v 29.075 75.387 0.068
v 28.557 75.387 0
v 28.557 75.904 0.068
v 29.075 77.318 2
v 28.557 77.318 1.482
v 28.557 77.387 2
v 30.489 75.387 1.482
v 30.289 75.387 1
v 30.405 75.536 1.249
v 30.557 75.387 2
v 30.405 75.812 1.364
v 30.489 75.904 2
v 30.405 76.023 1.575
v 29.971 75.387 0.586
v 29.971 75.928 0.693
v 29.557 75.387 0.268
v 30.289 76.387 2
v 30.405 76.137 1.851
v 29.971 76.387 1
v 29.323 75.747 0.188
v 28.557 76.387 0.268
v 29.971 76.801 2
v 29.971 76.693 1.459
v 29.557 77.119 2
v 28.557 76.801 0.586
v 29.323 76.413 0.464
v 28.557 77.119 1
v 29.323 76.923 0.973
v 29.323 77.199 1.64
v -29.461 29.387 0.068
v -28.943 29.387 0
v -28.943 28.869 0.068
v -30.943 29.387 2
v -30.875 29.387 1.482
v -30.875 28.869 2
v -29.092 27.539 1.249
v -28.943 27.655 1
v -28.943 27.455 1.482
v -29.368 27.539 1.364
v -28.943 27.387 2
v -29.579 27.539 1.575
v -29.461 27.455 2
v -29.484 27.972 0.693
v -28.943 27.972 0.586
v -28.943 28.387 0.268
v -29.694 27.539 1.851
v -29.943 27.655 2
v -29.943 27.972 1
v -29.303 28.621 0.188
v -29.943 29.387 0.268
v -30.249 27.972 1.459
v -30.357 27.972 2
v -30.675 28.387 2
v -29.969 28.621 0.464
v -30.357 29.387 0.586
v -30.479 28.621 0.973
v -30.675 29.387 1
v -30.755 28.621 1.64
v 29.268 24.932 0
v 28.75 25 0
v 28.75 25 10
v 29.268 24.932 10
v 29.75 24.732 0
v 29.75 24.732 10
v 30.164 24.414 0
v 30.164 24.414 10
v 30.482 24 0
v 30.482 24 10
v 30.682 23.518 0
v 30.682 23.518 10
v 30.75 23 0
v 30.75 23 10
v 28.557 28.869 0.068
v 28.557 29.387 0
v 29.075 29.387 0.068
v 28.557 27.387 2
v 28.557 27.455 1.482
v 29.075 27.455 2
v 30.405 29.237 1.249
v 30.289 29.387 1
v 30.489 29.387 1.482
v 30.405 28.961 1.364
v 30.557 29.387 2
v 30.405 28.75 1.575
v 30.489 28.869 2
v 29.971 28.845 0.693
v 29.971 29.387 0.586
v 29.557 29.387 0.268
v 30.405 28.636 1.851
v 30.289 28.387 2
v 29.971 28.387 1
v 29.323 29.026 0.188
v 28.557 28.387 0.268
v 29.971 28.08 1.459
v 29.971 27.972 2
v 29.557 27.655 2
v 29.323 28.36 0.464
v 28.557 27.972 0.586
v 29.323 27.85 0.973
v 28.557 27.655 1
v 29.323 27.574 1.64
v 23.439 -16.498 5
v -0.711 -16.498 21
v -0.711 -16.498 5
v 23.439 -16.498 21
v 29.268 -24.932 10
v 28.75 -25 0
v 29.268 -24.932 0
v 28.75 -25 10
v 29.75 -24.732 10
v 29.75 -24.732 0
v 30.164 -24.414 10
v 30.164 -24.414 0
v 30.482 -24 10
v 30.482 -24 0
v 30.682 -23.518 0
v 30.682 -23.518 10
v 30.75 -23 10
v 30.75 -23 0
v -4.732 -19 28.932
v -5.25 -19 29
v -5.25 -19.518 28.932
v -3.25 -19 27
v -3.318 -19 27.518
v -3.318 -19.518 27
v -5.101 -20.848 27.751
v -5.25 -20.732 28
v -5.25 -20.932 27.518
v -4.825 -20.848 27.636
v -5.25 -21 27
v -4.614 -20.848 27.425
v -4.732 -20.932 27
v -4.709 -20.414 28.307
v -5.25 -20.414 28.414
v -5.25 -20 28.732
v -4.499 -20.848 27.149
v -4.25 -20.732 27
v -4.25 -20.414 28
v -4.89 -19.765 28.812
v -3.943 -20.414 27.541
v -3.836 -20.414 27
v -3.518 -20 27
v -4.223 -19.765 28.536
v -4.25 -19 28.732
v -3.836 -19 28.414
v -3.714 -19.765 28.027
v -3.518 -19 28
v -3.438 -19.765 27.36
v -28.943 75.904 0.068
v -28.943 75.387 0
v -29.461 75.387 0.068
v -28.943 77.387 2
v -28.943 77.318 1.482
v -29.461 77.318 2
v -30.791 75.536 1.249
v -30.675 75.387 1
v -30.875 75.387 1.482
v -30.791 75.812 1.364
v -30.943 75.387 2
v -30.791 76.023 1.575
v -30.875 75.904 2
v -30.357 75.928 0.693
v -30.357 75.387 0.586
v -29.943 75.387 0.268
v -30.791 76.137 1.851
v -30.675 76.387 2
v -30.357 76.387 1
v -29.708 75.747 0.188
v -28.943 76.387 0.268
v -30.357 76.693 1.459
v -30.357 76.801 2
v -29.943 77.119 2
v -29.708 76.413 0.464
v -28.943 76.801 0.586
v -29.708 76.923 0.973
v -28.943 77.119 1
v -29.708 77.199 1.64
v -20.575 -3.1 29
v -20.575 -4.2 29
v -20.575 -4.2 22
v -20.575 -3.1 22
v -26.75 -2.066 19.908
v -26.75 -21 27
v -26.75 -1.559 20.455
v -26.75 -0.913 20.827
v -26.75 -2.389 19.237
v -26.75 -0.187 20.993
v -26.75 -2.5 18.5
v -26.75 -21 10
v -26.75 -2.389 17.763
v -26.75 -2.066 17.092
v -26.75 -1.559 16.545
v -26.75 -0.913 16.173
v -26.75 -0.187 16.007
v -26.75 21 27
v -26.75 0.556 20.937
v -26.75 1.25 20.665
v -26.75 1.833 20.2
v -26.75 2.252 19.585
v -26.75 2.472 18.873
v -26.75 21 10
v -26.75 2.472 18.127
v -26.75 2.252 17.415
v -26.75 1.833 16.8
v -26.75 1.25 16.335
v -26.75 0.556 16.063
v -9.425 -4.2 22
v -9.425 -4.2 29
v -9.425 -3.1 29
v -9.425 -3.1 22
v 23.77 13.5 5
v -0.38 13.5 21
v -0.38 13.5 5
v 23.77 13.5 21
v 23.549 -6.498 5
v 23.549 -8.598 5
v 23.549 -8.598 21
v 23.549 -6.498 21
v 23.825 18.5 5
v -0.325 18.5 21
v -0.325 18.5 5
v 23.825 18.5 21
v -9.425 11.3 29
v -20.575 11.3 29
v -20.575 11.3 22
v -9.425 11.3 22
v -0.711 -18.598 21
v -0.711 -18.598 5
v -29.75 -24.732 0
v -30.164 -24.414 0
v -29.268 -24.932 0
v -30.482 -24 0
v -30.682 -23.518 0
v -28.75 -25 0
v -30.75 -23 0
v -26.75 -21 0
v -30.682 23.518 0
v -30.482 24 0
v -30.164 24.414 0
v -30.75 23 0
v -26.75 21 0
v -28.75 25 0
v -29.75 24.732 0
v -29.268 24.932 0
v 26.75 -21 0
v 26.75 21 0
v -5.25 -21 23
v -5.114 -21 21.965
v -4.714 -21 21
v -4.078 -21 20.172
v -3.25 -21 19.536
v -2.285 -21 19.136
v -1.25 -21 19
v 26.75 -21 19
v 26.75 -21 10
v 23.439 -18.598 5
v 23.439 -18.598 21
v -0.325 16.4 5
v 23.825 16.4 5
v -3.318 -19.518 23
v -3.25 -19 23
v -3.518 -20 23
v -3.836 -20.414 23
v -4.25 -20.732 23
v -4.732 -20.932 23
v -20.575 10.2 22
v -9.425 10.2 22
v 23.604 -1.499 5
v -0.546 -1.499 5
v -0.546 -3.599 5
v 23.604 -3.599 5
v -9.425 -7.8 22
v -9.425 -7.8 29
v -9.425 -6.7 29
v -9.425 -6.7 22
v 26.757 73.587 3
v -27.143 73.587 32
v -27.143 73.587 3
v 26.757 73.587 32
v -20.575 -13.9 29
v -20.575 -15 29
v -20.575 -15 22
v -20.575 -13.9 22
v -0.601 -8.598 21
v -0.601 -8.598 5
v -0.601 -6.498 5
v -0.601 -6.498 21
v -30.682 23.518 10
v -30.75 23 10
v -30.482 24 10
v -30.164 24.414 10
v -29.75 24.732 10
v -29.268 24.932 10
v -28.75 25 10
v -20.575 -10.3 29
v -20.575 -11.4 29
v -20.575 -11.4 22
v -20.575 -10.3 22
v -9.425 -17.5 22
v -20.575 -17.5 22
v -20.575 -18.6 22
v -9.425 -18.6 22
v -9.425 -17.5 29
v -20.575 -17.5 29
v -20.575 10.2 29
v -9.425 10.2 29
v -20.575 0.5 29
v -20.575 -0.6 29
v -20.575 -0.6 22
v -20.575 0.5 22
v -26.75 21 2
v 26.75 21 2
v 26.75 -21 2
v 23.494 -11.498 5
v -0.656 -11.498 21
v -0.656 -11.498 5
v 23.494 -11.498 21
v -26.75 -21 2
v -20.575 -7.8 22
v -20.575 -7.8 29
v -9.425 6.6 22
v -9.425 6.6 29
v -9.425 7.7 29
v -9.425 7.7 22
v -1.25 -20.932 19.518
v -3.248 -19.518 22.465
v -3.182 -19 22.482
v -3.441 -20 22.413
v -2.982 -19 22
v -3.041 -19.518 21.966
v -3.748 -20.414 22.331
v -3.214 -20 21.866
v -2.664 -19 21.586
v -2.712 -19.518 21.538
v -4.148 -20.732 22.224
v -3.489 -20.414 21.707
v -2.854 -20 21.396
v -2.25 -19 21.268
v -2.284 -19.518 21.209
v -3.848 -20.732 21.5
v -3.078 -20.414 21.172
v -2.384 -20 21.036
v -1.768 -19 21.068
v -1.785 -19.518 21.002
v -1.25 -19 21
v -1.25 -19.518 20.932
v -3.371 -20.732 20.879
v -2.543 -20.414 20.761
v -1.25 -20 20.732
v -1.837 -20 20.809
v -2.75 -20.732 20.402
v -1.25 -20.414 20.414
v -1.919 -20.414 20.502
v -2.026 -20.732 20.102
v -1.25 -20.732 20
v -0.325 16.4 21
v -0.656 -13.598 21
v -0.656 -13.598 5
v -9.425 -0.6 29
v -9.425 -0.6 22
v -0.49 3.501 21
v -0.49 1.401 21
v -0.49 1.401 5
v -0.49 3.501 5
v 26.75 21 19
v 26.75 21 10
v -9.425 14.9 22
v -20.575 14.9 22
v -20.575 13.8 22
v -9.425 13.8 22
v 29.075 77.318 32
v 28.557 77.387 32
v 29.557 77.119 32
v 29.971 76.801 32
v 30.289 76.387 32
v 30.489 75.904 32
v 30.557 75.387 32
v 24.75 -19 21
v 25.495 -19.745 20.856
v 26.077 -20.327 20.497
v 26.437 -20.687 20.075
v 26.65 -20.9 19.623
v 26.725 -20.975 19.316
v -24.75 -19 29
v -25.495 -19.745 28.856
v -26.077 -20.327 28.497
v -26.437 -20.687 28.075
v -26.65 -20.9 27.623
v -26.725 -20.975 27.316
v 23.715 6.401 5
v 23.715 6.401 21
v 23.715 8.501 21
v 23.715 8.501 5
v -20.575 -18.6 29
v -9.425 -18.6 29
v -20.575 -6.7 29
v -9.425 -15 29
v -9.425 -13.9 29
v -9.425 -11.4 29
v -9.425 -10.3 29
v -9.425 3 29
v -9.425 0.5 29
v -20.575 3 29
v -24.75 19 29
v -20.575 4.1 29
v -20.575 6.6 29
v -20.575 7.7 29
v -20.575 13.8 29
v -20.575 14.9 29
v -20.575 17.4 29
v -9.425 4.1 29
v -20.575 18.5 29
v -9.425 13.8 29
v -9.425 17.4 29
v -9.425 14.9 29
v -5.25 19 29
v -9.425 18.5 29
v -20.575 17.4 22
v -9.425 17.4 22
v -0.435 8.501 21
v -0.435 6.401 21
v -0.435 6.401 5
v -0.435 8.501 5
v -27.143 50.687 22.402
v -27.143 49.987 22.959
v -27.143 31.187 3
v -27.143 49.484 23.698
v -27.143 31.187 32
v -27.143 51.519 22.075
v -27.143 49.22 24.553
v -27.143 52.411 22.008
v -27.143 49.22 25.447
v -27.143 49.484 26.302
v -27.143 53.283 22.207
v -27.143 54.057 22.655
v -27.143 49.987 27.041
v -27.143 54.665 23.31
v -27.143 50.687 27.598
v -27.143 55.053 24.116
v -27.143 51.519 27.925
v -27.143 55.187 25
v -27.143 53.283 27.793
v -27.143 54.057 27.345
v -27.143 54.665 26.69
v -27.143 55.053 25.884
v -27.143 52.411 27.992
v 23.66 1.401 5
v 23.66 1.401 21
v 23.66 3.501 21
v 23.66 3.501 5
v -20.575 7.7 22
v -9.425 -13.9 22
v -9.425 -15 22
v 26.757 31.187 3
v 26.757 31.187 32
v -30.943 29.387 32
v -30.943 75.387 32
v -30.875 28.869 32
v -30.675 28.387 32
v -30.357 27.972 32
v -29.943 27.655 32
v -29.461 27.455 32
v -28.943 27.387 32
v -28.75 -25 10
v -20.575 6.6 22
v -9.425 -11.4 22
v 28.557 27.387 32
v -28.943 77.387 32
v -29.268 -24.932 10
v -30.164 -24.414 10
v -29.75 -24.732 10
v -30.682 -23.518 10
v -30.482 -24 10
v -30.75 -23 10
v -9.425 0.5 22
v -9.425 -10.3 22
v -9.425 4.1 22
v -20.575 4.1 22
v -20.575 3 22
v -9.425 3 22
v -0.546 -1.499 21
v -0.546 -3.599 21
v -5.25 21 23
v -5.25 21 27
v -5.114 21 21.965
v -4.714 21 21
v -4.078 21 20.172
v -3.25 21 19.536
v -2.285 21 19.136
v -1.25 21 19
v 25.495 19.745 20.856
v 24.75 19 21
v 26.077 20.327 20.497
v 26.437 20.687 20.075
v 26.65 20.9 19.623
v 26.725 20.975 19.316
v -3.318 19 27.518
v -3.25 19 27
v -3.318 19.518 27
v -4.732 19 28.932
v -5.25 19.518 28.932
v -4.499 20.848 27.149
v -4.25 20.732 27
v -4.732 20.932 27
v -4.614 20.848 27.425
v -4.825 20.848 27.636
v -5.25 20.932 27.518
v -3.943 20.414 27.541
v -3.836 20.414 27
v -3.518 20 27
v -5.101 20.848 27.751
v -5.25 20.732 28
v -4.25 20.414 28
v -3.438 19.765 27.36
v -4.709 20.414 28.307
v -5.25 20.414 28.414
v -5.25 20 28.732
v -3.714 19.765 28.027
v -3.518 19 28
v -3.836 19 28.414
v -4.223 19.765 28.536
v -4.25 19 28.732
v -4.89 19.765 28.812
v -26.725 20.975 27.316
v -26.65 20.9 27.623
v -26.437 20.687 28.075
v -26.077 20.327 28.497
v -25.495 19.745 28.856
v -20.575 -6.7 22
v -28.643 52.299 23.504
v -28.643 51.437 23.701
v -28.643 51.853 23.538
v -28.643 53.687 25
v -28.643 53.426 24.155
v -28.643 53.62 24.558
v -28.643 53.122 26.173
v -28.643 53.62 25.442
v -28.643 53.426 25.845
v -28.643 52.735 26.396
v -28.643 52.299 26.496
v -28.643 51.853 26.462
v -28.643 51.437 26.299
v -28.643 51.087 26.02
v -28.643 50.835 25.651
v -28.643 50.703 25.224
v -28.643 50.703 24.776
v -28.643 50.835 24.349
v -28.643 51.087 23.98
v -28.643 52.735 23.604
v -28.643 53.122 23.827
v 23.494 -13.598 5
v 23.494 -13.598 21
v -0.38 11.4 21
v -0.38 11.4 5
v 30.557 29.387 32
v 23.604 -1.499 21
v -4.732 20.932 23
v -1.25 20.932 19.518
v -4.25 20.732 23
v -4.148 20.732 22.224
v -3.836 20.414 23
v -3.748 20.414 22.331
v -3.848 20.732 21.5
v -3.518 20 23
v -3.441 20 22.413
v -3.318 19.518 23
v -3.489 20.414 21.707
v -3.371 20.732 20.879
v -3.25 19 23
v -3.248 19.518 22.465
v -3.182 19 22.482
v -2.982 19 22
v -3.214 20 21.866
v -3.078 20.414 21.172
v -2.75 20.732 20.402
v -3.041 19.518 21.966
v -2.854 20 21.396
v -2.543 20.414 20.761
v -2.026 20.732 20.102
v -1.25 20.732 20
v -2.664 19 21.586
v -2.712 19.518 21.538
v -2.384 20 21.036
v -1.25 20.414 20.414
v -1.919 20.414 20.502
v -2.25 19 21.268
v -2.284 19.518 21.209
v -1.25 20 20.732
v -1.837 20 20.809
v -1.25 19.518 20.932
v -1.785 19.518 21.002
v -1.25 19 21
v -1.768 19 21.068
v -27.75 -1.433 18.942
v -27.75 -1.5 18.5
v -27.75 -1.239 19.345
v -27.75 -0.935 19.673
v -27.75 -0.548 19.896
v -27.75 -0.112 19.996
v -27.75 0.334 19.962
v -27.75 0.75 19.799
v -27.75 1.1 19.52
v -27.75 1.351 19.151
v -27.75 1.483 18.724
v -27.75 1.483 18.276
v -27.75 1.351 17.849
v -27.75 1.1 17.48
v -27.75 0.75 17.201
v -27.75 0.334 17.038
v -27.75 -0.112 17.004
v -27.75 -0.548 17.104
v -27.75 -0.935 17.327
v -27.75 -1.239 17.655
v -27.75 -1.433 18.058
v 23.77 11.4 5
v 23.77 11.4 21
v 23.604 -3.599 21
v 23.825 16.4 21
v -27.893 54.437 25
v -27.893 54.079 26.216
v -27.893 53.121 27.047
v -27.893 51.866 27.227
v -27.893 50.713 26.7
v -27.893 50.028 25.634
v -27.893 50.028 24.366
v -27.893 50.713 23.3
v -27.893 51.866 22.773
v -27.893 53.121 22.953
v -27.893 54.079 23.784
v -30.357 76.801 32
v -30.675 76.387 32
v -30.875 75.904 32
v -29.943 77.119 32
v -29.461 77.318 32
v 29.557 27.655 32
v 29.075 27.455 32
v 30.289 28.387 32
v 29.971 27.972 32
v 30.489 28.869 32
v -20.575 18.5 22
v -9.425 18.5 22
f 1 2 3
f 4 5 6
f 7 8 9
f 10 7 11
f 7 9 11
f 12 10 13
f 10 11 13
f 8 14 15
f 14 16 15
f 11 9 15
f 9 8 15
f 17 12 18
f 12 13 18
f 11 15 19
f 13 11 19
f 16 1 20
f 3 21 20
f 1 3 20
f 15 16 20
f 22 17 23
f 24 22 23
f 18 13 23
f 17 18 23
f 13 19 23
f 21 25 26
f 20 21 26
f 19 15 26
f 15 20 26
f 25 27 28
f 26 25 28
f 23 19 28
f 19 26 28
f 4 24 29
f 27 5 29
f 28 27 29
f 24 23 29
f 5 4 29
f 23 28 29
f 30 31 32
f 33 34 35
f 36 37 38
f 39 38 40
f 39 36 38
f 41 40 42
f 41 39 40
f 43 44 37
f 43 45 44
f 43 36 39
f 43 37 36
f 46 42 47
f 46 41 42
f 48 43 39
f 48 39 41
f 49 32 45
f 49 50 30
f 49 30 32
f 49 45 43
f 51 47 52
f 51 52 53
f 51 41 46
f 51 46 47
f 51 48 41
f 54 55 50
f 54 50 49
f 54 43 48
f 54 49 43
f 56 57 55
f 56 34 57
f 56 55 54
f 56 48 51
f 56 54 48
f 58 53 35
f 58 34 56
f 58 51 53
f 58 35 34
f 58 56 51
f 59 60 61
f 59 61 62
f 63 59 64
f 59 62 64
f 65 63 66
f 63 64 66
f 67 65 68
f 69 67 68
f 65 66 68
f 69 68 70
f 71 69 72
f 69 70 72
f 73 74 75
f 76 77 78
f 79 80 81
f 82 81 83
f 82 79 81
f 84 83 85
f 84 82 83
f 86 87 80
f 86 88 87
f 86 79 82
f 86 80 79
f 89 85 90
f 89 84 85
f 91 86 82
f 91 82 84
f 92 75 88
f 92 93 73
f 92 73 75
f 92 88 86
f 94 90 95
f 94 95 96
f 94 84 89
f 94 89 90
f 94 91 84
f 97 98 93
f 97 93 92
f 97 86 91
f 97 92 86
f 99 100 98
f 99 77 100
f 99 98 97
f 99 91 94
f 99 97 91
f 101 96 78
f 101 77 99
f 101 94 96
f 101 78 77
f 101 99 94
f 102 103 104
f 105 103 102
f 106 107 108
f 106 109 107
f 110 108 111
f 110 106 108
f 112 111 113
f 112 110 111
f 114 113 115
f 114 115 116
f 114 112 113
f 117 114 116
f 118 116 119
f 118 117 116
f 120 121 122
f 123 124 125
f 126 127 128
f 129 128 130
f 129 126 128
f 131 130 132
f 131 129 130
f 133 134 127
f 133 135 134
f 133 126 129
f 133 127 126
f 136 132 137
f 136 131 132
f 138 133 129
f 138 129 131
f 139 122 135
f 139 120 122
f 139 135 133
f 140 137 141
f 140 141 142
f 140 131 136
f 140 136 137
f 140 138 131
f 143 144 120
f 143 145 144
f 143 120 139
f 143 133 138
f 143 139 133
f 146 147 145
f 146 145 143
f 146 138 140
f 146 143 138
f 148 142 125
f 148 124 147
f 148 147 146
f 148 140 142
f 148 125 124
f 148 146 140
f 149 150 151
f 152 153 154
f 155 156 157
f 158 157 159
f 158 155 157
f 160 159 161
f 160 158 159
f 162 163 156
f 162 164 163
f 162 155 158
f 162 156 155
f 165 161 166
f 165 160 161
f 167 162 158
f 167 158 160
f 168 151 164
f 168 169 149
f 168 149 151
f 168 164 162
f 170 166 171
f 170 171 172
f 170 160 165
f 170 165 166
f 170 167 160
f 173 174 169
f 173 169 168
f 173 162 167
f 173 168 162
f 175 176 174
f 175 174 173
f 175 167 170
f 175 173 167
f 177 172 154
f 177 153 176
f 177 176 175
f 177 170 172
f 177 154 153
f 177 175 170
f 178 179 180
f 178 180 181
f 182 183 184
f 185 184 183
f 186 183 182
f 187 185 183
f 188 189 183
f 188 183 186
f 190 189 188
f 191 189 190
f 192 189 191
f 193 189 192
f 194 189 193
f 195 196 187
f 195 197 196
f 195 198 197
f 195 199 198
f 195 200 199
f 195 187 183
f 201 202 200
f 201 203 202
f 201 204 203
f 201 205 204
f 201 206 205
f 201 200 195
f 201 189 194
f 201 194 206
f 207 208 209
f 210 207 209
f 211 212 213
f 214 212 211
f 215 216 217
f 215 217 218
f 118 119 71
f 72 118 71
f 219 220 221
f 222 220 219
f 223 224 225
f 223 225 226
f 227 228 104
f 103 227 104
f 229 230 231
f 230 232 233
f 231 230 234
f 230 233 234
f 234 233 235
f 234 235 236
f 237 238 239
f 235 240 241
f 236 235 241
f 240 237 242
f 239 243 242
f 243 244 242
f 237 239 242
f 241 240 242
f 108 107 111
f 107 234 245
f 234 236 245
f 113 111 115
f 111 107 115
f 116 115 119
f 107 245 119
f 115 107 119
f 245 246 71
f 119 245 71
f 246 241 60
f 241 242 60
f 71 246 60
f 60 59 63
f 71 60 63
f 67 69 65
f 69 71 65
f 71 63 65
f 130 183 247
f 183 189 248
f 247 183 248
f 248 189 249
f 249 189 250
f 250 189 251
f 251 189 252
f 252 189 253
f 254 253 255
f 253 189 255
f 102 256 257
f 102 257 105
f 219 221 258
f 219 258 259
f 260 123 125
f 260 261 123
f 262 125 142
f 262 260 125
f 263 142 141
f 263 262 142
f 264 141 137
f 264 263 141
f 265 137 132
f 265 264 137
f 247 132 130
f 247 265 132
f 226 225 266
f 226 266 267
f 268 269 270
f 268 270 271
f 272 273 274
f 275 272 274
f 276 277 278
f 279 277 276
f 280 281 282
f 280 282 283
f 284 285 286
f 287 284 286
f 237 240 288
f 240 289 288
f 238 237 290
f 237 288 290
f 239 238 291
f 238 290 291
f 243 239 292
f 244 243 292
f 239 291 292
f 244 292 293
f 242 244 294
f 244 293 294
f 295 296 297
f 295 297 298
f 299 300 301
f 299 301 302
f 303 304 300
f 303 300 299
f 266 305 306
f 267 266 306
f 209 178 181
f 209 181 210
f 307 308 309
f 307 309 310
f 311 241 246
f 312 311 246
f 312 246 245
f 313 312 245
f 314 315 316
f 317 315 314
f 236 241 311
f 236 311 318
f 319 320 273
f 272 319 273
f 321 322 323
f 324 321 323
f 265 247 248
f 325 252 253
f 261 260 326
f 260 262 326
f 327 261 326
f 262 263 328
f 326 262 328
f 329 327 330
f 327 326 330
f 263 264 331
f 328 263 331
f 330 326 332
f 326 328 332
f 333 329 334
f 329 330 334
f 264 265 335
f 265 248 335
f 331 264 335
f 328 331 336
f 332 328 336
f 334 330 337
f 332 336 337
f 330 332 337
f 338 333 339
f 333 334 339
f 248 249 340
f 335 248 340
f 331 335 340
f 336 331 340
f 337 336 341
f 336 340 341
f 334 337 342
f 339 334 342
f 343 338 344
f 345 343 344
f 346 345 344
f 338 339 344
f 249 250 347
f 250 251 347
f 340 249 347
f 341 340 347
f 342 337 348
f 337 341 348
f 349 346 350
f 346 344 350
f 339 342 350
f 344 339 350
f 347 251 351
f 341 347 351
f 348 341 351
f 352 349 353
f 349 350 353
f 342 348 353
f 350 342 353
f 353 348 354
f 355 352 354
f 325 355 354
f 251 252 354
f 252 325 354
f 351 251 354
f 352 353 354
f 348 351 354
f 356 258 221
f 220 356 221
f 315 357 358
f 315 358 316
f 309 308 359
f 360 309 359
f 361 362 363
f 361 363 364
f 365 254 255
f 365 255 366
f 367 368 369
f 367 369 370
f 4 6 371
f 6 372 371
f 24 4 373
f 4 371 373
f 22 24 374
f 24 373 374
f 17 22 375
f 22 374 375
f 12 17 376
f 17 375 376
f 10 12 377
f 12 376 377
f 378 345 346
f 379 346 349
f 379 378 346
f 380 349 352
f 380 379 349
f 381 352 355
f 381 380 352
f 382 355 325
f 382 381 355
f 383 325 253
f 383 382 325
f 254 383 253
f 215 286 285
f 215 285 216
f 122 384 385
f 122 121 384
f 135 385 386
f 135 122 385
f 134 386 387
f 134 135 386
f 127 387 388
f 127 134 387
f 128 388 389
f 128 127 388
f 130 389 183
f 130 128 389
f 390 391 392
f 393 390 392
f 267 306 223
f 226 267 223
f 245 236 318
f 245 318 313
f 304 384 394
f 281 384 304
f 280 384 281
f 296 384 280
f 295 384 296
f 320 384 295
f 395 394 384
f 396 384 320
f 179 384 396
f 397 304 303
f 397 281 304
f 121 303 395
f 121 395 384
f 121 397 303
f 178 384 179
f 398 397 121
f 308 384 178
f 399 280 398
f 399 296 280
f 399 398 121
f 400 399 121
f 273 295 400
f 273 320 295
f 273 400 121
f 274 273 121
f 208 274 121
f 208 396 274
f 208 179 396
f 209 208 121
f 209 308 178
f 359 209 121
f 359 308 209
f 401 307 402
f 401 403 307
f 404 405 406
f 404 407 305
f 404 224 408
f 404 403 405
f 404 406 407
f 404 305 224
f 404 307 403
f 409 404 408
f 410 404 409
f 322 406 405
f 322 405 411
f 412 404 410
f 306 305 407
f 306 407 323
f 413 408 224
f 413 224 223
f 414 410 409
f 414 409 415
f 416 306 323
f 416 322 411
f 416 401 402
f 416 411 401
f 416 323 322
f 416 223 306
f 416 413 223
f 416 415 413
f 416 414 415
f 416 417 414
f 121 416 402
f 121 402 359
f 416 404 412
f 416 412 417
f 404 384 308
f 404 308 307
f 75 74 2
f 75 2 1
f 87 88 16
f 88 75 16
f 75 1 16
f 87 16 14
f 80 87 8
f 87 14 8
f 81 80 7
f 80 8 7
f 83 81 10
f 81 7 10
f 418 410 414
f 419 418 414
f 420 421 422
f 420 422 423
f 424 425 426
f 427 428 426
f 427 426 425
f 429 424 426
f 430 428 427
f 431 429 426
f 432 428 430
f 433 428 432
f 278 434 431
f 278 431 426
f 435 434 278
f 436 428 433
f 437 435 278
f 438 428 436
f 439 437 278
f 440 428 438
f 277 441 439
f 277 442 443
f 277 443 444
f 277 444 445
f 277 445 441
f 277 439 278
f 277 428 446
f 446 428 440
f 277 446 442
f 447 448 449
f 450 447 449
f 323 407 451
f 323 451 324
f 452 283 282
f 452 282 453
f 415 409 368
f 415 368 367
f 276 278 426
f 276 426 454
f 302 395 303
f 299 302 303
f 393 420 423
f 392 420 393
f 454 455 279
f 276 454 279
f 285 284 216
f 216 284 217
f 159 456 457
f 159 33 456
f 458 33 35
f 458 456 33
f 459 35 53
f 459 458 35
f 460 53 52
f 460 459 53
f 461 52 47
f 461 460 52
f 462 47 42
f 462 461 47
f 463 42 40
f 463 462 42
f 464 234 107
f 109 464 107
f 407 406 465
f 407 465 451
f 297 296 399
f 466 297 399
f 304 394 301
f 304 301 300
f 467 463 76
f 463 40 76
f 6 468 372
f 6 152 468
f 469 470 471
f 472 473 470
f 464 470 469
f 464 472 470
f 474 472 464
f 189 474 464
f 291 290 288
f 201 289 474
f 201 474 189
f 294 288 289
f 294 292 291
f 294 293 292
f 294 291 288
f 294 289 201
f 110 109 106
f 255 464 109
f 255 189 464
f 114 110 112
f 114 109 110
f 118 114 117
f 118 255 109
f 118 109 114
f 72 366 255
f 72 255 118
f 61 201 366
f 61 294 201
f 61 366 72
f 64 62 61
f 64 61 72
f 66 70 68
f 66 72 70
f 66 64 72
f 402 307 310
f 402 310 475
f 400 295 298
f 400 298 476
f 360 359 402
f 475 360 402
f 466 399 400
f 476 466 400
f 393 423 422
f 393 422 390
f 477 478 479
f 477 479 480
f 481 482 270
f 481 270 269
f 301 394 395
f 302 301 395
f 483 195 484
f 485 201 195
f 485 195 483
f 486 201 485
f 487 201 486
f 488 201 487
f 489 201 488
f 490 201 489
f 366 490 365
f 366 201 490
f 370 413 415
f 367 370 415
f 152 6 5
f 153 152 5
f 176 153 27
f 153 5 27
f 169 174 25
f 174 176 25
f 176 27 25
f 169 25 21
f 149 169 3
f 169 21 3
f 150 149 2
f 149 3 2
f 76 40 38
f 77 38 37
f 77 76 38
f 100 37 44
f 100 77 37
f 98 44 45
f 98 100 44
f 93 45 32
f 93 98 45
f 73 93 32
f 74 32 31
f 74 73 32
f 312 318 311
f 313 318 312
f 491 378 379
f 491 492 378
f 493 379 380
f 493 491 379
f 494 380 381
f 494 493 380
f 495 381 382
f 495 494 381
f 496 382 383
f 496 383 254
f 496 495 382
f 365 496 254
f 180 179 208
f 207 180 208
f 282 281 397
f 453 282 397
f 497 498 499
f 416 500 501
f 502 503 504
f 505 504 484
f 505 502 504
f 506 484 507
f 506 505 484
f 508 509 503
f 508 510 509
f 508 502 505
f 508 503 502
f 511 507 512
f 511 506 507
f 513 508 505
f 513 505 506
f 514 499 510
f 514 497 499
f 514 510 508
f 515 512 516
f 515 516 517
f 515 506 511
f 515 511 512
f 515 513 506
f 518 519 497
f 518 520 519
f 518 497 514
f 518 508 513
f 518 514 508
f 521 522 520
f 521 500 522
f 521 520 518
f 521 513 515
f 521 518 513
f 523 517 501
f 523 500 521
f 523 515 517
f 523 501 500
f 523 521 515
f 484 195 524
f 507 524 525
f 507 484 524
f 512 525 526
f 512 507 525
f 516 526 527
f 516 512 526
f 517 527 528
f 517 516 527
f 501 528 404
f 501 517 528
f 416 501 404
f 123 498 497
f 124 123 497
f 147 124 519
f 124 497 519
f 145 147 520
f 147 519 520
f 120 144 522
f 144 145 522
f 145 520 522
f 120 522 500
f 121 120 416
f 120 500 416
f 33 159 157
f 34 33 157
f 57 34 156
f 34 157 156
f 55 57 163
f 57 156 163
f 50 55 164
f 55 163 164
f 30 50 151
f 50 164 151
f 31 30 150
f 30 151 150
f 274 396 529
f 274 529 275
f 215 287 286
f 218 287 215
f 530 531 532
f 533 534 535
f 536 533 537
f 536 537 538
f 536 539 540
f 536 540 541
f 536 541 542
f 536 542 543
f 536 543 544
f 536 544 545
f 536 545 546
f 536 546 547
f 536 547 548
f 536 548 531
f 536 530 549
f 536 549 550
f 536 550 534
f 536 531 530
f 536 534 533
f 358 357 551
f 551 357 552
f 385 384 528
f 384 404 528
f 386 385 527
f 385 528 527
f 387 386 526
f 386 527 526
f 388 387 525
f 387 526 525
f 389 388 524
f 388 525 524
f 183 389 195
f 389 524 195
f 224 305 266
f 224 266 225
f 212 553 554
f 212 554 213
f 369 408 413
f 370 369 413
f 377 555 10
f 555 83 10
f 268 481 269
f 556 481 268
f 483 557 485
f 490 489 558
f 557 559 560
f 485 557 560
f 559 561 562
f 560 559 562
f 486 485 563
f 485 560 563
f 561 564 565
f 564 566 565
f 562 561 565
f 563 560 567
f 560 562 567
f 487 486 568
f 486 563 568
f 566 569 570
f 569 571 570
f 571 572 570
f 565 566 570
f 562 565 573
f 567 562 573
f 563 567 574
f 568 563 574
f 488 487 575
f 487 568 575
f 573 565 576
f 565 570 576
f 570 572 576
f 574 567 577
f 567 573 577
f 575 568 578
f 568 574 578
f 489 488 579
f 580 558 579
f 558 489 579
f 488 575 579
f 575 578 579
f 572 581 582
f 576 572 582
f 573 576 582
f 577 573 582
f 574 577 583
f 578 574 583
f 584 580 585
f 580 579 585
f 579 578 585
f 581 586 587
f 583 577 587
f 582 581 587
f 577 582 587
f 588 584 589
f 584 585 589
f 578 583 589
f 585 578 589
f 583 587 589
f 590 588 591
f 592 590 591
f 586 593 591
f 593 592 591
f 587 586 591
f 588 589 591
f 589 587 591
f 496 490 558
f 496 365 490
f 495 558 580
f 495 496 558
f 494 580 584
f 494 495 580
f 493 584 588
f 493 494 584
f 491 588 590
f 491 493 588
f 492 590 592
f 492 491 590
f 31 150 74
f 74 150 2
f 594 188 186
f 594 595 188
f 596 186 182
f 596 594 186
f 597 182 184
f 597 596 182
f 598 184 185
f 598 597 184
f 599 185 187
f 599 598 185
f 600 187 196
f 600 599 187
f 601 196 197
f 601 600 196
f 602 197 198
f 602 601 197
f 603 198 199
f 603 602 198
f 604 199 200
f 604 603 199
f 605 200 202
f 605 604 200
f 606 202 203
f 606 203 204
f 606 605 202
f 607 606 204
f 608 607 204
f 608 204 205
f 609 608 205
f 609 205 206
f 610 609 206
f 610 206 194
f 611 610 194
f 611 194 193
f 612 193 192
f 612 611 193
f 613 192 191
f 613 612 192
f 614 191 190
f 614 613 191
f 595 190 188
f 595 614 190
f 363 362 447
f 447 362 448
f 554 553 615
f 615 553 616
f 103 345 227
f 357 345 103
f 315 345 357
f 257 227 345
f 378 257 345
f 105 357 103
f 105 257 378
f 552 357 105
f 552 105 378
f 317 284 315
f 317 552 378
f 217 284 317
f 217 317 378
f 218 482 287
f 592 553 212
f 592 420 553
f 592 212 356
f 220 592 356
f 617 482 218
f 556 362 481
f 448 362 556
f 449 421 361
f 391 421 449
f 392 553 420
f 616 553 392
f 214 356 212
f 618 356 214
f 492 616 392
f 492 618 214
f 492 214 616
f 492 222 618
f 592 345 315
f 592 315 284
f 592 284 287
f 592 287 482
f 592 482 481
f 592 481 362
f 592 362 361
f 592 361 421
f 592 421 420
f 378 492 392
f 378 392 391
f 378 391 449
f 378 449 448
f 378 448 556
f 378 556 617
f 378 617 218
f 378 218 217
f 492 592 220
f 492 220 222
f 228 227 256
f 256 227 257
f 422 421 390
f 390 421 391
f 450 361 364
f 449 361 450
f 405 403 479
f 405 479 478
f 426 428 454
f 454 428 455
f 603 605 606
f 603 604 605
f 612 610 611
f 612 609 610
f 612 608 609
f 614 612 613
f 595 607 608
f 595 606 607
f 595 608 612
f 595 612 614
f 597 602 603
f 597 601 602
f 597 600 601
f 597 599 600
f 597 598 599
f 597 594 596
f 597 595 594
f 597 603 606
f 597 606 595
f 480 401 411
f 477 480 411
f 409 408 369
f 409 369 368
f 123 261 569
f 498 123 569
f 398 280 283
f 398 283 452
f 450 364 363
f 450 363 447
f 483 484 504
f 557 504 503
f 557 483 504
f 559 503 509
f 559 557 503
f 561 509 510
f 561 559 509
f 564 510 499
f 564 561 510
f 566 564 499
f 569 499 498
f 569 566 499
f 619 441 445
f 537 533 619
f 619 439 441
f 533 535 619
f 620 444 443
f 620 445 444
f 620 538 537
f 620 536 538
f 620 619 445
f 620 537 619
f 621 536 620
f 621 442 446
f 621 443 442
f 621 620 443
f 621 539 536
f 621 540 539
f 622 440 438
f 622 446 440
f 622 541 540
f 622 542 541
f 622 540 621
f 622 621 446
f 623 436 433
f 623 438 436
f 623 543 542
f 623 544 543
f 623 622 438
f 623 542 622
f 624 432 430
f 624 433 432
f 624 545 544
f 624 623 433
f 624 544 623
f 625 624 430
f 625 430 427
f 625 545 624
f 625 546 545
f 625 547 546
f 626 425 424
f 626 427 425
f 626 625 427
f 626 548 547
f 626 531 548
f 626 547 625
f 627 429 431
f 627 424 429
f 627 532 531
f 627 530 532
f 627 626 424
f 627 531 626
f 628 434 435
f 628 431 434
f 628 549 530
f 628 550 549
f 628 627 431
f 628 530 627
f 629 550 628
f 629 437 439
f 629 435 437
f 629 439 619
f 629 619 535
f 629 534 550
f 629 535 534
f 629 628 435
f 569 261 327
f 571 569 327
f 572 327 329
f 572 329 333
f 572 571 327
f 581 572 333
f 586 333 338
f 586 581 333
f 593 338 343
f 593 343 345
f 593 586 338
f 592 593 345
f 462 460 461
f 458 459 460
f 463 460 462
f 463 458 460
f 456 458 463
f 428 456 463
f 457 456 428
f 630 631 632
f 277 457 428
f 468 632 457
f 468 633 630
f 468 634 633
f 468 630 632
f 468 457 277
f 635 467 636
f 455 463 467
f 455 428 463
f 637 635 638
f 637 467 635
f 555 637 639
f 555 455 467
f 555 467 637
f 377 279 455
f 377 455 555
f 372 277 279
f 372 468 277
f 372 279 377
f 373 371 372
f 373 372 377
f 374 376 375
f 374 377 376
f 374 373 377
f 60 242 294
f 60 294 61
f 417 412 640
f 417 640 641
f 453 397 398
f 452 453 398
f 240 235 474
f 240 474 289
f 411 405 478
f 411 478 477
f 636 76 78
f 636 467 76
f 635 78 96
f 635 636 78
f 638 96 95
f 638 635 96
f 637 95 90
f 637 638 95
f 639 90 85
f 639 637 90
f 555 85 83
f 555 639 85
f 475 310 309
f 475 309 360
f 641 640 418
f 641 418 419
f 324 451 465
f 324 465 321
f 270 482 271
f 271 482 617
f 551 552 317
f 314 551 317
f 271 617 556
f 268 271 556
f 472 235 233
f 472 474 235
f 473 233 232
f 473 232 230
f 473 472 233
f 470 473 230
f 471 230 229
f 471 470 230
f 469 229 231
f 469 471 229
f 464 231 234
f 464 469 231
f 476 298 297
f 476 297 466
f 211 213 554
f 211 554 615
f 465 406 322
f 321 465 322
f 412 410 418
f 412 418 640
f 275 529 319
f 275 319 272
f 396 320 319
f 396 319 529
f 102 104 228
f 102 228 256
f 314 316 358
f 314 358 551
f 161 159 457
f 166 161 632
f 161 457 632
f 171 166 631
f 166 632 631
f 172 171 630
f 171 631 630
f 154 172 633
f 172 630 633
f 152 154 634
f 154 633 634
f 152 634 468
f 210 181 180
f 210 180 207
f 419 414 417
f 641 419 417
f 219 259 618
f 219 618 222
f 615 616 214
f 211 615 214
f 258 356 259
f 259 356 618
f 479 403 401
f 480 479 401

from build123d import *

# Parameters (mm, degrees)
F0_W      = 61.5
F0_H      = 50
F1_DEPTH  = 21
F2_W      = 61.5
F2_H      = 50
F2_W_2    = 53.5
F2_H_2    = 42
F3_DEPTH  = 11
F4_W      = 23.5
F4_H      = 42
F5_DEPTH  = 8
F6_W      = 11.15
F6_H      = 1.1
F7_DEPTH  = 7
F8_W      = 24.15
F8_H      = 2.1
F9_DEPTH  = 16
F10_F1_R  = 2
F10_F2_R  = 2
F11_W     = 61.5
F11_H     = 50
F12_DEPTH = 32
F13_W     = 53.9
F13_H     = 42.4
F14_DEPTH = 29
F15_R     = 2.5
F16_DEPTH = 1
F16_TAPER = 45
F17_R     = 3
F18_DEPTH = 1.5
F18_TAPER = 45
F19_R     = 2
F20_W     = 53.5
F20_H     = 42
F21_DEPTH = 2


with BuildPart() as f1:
    # F0 (on Top) → F1 (new body)
    with BuildSketch(Plane.XY):
        Rectangle(F0_W, F0_H)
    extrude(amount=F1_DEPTH)

    # F2 (on face) → F3 (cut)
    with BuildSketch(Plane.XY.offset(21)):
        Rectangle(F2_W, F2_H)
        Rectangle(F2_W_2, F2_H_2, mode=Mode.SUBTRACT)
    extrude(amount=-F3_DEPTH, mode=Mode.SUBTRACT)

    # F4 (on face) → F5 (join)
    with BuildSketch(Plane.XY.offset(21)):
        with Locations((-15, 0)):
            Rectangle(F4_W, F4_H)
    extrude(amount=F5_DEPTH)

    # F6 (on face) → F7 (cut)
    with BuildSketch(Plane.XY.offset(29)):
        with Locations((-15, 17.95)):
            Rectangle(F6_W, F6_H)
        with Locations((-15, 14.3500323179)):
            Rectangle(F6_W, F6_H)
        with Locations((-15, 10.7500646357)):
            Rectangle(F6_W, F6_H)
        with Locations((-15, 7.1500969536)):
            Rectangle(F6_W, F6_H)
        with Locations((-15, 3.5501292715)):
            Rectangle(F6_W, F6_H)
        with Locations((-15, -0.0498384107)):
            Rectangle(F6_W, F6_H)
        with Locations((-15, -3.6498060928)):
            Rectangle(F6_W, F6_H)
        with Locations((-15, -7.249773775)):
            Rectangle(F6_W, F6_H)
        with Locations((-15, -10.8497414571)):
            Rectangle(F6_W, F6_H)
        with Locations((-15, -14.4497091392)):
            Rectangle(F6_W, F6_H)
        with Locations((-15, -18.0496768214)):
            Rectangle(F6_W, F6_H)
    extrude(amount=-F7_DEPTH, mode=Mode.SUBTRACT)

    # F8 (on face) → F9 (cut)
    with BuildSketch(Plane.XY.offset(21)):
        with Locations((11.75, 17.45)):
            Rectangle(F8_W, F8_H)
        with Locations((11.6948562951, 12.4503040921)):
            Rectangle(F8_W, F8_H)
        with Locations((11.6397125903, 7.4506081841)):
            Rectangle(F8_W, F8_H)
        with Locations((11.5845688854, 2.4509122762)):
            Rectangle(F8_W, F8_H)
        with Locations((11.5294251805, -2.5487836317)):
            Rectangle(F8_W, F8_H)
        with Locations((11.4742814757, -7.5484795397)):
            Rectangle(F8_W, F8_H)
        with Locations((11.4191377708, -12.5481754476)):
            Rectangle(F8_W, F8_H)
        with Locations((11.3639940659, -17.5478713555)):
            Rectangle(F8_W, F8_H)
    extrude(amount=-F9_DEPTH, mode=Mode.SUBTRACT)

    # F10: fillet of radius 2 on 12 edges, made by hand

    # F10_f1
    f10_f1_edges = [f1.edges().sort_by_distance(p)[0] for p in [
        (-3.25, 0, 21),
    ]]
    fillet(f10_f1_edges, radius=F10_F1_R)

    # F10_f2
    f10_f2_edges = [f1.edges().sort_by_distance(p)[0] for p in [
        (-3.25, 0, 29),
        (26.75, 0, 21),
        (-26.75, 0, 29),
        (-30.75, -25, 5),
        (-30.75, 25, 5),
        (30.75, -25, 5),
        (30.75, 25, 5),
        (-15, -21, 29),
        (12.75, -21, 21),
        (12.75, 21, 21),
        (-15, 21, 29),
        (-2.6642135624, 21, 21.5857864376),
        (-2.6642135624, -21, 21.5857864376),
    ]]
    fillet(f10_f2_edges, radius=F10_F2_R)

    # F15 (on face) → F16 (join)
    with BuildSketch(Plane(origin=(-26.75, 0, 0), x_dir=(0, -1, 0), z_dir=(-1, 0, 0))):
        with Locations((0, 18.5)):
            Circle(F15_R)
    extrude(amount=F16_DEPTH, taper=F16_TAPER)

    # F20 (on face) → F21 (cut)
    with BuildSketch(Plane(origin=(0, 0, 0), x_dir=(1, 0, 0), z_dir=(0, 0, -1))):
        Rectangle(F20_W, F20_H)
    extrude(amount=-F21_DEPTH, mode=Mode.SUBTRACT)


with BuildPart() as f12:
    # F11 (on Top) → F12 (new body)
    with BuildSketch(Plane.XY):
        with Locations((-0.1928630173, 52.3866325617)):
            Rectangle(F11_W, F11_H)
    extrude(amount=F12_DEPTH)

    # F13 (on face) → F14 (cut)
    with BuildSketch(Plane.XY.offset(32)):
        with Locations((-0.1928630173, 52.3866325617)):
            Rectangle(F13_W, F13_H)
    extrude(amount=-F14_DEPTH, mode=Mode.SUBTRACT)

    # F17 (on face) → F18 (cut)
    with BuildSketch(Plane.YZ.offset(-27.1428630173)):
        with Locations((52.1866325617, 25)):
            Circle(F17_R)
    extrude(amount=-F18_DEPTH, taper=F18_TAPER, mode=Mode.SUBTRACT)

    # F19
    f19_edges = [f12.edges().sort_by_distance(p)[0] for p in [
        (-0.192863, 77.386633, 0),
        (-30.942863, 52.386633, 0),
        (-0.192863, 27.386633, 0),
        (30.557137, 52.386633, 0),
        (-30.942863, 77.386633, 16),
        (-30.942863, 27.386633, 16),
        (30.557137, 27.386633, 16),
        (30.557137, 77.386633, 16),
    ]]
    fillet(f19_edges, radius=F19_R)


solid = Compound([f1.part, f12.part])
